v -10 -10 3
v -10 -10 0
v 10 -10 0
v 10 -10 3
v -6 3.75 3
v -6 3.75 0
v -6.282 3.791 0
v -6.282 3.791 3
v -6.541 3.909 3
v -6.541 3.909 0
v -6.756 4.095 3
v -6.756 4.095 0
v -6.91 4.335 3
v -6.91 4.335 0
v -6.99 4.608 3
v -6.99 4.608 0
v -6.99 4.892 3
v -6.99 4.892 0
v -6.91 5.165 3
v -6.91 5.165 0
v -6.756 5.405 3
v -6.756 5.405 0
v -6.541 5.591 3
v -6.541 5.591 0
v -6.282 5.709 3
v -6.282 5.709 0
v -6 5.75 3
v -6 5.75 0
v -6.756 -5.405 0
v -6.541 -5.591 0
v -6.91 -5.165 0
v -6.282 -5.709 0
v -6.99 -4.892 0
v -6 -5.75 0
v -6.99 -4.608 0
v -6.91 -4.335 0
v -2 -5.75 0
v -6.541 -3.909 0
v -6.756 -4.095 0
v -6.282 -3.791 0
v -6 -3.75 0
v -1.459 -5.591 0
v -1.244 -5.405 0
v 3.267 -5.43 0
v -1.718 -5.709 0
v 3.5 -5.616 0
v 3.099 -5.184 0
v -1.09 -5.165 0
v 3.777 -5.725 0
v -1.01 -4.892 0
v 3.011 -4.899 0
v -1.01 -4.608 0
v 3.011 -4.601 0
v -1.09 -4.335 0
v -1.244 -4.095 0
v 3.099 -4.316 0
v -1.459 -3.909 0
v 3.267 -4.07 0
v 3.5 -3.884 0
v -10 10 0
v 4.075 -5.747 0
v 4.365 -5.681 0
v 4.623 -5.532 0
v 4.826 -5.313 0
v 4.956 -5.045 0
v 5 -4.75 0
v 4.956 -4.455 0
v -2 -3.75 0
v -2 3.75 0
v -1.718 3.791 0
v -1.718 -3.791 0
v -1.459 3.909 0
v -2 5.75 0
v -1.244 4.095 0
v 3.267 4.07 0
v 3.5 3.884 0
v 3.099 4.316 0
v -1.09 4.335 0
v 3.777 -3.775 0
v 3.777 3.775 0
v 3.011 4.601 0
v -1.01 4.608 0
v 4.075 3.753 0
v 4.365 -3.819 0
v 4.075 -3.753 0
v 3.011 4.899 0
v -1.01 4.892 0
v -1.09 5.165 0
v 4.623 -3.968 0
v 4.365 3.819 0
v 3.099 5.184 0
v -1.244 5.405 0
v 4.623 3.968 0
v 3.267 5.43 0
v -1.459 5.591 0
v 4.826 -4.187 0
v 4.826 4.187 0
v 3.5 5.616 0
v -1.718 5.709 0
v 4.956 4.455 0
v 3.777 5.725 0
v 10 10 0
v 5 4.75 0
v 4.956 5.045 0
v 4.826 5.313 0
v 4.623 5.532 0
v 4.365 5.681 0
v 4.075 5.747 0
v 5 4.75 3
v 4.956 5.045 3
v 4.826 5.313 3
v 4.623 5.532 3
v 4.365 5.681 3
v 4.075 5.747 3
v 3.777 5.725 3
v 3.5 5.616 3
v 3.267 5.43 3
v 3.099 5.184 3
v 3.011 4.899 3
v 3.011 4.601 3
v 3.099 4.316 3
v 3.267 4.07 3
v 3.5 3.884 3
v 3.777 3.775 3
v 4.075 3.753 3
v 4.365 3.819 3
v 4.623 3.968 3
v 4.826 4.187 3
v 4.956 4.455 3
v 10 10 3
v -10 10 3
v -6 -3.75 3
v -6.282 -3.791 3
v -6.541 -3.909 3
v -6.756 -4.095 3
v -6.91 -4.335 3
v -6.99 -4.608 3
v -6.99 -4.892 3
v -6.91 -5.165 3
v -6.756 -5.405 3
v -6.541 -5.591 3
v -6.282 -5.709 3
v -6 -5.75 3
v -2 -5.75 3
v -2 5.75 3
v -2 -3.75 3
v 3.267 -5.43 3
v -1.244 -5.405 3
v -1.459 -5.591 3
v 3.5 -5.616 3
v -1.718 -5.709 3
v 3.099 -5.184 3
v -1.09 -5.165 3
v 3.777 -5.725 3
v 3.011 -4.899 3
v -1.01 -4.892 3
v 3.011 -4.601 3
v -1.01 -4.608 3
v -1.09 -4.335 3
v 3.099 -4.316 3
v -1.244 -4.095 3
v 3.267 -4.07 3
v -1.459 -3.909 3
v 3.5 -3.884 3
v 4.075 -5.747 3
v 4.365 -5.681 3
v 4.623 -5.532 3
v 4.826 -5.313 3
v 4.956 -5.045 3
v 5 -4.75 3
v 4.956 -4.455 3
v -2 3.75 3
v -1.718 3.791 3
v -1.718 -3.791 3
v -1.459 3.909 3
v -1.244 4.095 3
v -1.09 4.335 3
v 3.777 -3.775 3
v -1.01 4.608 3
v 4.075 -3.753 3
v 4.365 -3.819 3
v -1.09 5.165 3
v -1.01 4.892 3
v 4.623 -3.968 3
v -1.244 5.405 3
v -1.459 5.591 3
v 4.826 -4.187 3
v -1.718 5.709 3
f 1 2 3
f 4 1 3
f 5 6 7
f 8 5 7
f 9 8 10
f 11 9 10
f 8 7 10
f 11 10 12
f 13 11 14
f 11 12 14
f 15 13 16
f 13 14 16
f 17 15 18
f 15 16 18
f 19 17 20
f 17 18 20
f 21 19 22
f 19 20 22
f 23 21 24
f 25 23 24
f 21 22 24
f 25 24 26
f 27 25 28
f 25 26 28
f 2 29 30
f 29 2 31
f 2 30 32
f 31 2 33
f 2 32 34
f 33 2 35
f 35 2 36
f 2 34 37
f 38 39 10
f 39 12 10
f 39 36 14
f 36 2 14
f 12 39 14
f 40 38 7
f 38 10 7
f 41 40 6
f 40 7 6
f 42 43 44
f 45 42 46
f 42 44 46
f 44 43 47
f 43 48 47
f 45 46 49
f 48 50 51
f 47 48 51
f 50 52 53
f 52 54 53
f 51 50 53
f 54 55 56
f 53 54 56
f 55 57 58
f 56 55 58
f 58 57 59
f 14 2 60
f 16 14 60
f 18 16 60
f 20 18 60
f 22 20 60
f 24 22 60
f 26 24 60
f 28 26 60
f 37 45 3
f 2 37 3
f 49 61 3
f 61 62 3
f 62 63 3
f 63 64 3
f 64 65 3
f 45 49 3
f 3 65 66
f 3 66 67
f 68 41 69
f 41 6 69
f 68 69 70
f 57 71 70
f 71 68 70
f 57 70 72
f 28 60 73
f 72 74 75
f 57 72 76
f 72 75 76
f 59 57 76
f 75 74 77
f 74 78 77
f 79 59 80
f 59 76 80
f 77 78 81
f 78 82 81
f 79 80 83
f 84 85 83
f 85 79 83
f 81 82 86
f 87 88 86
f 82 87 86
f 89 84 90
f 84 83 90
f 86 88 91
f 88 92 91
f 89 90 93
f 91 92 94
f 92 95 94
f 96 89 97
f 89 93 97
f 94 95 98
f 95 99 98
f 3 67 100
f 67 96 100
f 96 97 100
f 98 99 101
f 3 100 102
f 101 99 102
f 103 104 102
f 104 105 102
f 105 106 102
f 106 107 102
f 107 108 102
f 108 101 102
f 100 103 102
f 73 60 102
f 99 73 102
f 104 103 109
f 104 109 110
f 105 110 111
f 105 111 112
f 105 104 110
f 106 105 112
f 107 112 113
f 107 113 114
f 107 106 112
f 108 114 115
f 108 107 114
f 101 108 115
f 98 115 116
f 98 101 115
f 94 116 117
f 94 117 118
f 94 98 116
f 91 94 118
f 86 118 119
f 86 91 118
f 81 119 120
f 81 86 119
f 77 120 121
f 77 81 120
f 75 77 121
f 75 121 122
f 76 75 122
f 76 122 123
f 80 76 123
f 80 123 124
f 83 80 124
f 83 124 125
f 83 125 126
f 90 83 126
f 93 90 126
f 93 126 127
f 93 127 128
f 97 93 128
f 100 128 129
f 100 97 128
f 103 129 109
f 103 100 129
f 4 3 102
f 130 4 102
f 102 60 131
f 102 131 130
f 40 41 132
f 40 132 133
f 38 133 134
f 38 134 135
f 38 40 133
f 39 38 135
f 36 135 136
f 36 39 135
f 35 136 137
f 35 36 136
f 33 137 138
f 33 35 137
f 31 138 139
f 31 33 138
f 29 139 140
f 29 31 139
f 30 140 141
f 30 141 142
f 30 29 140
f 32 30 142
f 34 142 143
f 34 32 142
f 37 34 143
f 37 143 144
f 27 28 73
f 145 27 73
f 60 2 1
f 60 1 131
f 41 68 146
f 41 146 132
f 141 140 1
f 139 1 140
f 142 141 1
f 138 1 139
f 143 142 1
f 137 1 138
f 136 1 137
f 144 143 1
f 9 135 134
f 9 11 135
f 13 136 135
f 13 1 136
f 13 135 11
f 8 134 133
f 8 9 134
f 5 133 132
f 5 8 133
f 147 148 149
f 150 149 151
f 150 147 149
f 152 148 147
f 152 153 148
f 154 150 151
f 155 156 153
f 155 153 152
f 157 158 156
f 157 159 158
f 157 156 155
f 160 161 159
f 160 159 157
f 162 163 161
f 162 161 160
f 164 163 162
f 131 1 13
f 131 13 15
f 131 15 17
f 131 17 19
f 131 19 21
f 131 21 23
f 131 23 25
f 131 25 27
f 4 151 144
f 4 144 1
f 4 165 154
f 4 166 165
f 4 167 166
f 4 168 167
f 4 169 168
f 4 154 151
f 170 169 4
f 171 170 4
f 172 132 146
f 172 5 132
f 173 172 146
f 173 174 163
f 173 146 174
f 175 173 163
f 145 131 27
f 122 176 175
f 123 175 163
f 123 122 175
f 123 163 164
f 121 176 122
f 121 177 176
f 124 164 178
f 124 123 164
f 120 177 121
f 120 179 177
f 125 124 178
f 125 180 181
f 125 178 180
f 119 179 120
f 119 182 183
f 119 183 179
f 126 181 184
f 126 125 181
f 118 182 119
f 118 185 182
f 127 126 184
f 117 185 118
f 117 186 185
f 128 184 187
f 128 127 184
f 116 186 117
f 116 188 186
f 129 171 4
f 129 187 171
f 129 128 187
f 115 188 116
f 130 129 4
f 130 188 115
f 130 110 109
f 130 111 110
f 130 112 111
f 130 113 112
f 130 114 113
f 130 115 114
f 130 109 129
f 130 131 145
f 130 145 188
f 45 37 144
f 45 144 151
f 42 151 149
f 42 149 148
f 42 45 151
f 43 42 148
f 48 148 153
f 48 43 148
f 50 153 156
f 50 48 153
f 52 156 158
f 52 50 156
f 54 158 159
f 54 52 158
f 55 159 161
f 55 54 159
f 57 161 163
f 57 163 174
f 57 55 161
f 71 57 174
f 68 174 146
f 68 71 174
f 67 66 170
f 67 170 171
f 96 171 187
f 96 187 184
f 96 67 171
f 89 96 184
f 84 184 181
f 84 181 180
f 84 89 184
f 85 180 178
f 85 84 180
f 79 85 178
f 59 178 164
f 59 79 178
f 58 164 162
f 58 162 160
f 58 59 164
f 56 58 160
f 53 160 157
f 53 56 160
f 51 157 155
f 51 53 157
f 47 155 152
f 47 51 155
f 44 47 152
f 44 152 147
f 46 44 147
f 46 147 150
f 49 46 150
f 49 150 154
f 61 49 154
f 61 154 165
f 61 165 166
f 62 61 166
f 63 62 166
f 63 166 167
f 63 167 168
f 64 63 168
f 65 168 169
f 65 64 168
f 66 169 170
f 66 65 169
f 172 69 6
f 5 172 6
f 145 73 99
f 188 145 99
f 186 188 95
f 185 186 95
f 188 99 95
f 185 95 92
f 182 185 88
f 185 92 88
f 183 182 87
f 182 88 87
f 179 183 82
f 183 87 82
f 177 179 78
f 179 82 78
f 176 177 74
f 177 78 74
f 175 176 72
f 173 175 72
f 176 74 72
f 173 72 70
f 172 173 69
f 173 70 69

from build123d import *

# Parameters (mm, degrees)
SKETCH_1_W      = 20
SKETCH_1_H      = 20
SKETCH_1_R      = 1
EXTRUDE_1_DEPTH = 3


with BuildPart() as part:
    # 草图1 → 凸台-拉伸1 (new body)
    with BuildSketch(Plane.XY):
        Rectangle(SKETCH_1_W, SKETCH_1_H)
        with Locations((4, 4.75)):
            Circle(SKETCH_1_R, mode=Mode.SUBTRACT)
        with Locations((4, -4.75)):
            Circle(SKETCH_1_R, mode=Mode.SUBTRACT)
        with BuildLine():
            Line((-6, 5.75), (-2, 5.75))
            ThreePointArc((-2, 5.75), (-1, 4.75), (-2, 3.75))
            Line((-2, 3.75), (-6, 3.75))
            ThreePointArc((-6, 3.75), (-7, 4.75), (-6, 5.75))
        make_face(mode=Mode.SUBTRACT)
        with BuildLine():
            Line((-6, -5.75), (-2, -5.75))
            ThreePointArc((-2, -5.75), (-1, -4.75), (-2, -3.75))
            Line((-2, -3.75), (-6, -3.75))
            ThreePointArc((-6, -3.75), (-7, -4.75), (-6, -5.75))
        make_face(mode=Mode.SUBTRACT)
    extrude(amount=EXTRUDE_1_DEPTH)


solid = part.part
